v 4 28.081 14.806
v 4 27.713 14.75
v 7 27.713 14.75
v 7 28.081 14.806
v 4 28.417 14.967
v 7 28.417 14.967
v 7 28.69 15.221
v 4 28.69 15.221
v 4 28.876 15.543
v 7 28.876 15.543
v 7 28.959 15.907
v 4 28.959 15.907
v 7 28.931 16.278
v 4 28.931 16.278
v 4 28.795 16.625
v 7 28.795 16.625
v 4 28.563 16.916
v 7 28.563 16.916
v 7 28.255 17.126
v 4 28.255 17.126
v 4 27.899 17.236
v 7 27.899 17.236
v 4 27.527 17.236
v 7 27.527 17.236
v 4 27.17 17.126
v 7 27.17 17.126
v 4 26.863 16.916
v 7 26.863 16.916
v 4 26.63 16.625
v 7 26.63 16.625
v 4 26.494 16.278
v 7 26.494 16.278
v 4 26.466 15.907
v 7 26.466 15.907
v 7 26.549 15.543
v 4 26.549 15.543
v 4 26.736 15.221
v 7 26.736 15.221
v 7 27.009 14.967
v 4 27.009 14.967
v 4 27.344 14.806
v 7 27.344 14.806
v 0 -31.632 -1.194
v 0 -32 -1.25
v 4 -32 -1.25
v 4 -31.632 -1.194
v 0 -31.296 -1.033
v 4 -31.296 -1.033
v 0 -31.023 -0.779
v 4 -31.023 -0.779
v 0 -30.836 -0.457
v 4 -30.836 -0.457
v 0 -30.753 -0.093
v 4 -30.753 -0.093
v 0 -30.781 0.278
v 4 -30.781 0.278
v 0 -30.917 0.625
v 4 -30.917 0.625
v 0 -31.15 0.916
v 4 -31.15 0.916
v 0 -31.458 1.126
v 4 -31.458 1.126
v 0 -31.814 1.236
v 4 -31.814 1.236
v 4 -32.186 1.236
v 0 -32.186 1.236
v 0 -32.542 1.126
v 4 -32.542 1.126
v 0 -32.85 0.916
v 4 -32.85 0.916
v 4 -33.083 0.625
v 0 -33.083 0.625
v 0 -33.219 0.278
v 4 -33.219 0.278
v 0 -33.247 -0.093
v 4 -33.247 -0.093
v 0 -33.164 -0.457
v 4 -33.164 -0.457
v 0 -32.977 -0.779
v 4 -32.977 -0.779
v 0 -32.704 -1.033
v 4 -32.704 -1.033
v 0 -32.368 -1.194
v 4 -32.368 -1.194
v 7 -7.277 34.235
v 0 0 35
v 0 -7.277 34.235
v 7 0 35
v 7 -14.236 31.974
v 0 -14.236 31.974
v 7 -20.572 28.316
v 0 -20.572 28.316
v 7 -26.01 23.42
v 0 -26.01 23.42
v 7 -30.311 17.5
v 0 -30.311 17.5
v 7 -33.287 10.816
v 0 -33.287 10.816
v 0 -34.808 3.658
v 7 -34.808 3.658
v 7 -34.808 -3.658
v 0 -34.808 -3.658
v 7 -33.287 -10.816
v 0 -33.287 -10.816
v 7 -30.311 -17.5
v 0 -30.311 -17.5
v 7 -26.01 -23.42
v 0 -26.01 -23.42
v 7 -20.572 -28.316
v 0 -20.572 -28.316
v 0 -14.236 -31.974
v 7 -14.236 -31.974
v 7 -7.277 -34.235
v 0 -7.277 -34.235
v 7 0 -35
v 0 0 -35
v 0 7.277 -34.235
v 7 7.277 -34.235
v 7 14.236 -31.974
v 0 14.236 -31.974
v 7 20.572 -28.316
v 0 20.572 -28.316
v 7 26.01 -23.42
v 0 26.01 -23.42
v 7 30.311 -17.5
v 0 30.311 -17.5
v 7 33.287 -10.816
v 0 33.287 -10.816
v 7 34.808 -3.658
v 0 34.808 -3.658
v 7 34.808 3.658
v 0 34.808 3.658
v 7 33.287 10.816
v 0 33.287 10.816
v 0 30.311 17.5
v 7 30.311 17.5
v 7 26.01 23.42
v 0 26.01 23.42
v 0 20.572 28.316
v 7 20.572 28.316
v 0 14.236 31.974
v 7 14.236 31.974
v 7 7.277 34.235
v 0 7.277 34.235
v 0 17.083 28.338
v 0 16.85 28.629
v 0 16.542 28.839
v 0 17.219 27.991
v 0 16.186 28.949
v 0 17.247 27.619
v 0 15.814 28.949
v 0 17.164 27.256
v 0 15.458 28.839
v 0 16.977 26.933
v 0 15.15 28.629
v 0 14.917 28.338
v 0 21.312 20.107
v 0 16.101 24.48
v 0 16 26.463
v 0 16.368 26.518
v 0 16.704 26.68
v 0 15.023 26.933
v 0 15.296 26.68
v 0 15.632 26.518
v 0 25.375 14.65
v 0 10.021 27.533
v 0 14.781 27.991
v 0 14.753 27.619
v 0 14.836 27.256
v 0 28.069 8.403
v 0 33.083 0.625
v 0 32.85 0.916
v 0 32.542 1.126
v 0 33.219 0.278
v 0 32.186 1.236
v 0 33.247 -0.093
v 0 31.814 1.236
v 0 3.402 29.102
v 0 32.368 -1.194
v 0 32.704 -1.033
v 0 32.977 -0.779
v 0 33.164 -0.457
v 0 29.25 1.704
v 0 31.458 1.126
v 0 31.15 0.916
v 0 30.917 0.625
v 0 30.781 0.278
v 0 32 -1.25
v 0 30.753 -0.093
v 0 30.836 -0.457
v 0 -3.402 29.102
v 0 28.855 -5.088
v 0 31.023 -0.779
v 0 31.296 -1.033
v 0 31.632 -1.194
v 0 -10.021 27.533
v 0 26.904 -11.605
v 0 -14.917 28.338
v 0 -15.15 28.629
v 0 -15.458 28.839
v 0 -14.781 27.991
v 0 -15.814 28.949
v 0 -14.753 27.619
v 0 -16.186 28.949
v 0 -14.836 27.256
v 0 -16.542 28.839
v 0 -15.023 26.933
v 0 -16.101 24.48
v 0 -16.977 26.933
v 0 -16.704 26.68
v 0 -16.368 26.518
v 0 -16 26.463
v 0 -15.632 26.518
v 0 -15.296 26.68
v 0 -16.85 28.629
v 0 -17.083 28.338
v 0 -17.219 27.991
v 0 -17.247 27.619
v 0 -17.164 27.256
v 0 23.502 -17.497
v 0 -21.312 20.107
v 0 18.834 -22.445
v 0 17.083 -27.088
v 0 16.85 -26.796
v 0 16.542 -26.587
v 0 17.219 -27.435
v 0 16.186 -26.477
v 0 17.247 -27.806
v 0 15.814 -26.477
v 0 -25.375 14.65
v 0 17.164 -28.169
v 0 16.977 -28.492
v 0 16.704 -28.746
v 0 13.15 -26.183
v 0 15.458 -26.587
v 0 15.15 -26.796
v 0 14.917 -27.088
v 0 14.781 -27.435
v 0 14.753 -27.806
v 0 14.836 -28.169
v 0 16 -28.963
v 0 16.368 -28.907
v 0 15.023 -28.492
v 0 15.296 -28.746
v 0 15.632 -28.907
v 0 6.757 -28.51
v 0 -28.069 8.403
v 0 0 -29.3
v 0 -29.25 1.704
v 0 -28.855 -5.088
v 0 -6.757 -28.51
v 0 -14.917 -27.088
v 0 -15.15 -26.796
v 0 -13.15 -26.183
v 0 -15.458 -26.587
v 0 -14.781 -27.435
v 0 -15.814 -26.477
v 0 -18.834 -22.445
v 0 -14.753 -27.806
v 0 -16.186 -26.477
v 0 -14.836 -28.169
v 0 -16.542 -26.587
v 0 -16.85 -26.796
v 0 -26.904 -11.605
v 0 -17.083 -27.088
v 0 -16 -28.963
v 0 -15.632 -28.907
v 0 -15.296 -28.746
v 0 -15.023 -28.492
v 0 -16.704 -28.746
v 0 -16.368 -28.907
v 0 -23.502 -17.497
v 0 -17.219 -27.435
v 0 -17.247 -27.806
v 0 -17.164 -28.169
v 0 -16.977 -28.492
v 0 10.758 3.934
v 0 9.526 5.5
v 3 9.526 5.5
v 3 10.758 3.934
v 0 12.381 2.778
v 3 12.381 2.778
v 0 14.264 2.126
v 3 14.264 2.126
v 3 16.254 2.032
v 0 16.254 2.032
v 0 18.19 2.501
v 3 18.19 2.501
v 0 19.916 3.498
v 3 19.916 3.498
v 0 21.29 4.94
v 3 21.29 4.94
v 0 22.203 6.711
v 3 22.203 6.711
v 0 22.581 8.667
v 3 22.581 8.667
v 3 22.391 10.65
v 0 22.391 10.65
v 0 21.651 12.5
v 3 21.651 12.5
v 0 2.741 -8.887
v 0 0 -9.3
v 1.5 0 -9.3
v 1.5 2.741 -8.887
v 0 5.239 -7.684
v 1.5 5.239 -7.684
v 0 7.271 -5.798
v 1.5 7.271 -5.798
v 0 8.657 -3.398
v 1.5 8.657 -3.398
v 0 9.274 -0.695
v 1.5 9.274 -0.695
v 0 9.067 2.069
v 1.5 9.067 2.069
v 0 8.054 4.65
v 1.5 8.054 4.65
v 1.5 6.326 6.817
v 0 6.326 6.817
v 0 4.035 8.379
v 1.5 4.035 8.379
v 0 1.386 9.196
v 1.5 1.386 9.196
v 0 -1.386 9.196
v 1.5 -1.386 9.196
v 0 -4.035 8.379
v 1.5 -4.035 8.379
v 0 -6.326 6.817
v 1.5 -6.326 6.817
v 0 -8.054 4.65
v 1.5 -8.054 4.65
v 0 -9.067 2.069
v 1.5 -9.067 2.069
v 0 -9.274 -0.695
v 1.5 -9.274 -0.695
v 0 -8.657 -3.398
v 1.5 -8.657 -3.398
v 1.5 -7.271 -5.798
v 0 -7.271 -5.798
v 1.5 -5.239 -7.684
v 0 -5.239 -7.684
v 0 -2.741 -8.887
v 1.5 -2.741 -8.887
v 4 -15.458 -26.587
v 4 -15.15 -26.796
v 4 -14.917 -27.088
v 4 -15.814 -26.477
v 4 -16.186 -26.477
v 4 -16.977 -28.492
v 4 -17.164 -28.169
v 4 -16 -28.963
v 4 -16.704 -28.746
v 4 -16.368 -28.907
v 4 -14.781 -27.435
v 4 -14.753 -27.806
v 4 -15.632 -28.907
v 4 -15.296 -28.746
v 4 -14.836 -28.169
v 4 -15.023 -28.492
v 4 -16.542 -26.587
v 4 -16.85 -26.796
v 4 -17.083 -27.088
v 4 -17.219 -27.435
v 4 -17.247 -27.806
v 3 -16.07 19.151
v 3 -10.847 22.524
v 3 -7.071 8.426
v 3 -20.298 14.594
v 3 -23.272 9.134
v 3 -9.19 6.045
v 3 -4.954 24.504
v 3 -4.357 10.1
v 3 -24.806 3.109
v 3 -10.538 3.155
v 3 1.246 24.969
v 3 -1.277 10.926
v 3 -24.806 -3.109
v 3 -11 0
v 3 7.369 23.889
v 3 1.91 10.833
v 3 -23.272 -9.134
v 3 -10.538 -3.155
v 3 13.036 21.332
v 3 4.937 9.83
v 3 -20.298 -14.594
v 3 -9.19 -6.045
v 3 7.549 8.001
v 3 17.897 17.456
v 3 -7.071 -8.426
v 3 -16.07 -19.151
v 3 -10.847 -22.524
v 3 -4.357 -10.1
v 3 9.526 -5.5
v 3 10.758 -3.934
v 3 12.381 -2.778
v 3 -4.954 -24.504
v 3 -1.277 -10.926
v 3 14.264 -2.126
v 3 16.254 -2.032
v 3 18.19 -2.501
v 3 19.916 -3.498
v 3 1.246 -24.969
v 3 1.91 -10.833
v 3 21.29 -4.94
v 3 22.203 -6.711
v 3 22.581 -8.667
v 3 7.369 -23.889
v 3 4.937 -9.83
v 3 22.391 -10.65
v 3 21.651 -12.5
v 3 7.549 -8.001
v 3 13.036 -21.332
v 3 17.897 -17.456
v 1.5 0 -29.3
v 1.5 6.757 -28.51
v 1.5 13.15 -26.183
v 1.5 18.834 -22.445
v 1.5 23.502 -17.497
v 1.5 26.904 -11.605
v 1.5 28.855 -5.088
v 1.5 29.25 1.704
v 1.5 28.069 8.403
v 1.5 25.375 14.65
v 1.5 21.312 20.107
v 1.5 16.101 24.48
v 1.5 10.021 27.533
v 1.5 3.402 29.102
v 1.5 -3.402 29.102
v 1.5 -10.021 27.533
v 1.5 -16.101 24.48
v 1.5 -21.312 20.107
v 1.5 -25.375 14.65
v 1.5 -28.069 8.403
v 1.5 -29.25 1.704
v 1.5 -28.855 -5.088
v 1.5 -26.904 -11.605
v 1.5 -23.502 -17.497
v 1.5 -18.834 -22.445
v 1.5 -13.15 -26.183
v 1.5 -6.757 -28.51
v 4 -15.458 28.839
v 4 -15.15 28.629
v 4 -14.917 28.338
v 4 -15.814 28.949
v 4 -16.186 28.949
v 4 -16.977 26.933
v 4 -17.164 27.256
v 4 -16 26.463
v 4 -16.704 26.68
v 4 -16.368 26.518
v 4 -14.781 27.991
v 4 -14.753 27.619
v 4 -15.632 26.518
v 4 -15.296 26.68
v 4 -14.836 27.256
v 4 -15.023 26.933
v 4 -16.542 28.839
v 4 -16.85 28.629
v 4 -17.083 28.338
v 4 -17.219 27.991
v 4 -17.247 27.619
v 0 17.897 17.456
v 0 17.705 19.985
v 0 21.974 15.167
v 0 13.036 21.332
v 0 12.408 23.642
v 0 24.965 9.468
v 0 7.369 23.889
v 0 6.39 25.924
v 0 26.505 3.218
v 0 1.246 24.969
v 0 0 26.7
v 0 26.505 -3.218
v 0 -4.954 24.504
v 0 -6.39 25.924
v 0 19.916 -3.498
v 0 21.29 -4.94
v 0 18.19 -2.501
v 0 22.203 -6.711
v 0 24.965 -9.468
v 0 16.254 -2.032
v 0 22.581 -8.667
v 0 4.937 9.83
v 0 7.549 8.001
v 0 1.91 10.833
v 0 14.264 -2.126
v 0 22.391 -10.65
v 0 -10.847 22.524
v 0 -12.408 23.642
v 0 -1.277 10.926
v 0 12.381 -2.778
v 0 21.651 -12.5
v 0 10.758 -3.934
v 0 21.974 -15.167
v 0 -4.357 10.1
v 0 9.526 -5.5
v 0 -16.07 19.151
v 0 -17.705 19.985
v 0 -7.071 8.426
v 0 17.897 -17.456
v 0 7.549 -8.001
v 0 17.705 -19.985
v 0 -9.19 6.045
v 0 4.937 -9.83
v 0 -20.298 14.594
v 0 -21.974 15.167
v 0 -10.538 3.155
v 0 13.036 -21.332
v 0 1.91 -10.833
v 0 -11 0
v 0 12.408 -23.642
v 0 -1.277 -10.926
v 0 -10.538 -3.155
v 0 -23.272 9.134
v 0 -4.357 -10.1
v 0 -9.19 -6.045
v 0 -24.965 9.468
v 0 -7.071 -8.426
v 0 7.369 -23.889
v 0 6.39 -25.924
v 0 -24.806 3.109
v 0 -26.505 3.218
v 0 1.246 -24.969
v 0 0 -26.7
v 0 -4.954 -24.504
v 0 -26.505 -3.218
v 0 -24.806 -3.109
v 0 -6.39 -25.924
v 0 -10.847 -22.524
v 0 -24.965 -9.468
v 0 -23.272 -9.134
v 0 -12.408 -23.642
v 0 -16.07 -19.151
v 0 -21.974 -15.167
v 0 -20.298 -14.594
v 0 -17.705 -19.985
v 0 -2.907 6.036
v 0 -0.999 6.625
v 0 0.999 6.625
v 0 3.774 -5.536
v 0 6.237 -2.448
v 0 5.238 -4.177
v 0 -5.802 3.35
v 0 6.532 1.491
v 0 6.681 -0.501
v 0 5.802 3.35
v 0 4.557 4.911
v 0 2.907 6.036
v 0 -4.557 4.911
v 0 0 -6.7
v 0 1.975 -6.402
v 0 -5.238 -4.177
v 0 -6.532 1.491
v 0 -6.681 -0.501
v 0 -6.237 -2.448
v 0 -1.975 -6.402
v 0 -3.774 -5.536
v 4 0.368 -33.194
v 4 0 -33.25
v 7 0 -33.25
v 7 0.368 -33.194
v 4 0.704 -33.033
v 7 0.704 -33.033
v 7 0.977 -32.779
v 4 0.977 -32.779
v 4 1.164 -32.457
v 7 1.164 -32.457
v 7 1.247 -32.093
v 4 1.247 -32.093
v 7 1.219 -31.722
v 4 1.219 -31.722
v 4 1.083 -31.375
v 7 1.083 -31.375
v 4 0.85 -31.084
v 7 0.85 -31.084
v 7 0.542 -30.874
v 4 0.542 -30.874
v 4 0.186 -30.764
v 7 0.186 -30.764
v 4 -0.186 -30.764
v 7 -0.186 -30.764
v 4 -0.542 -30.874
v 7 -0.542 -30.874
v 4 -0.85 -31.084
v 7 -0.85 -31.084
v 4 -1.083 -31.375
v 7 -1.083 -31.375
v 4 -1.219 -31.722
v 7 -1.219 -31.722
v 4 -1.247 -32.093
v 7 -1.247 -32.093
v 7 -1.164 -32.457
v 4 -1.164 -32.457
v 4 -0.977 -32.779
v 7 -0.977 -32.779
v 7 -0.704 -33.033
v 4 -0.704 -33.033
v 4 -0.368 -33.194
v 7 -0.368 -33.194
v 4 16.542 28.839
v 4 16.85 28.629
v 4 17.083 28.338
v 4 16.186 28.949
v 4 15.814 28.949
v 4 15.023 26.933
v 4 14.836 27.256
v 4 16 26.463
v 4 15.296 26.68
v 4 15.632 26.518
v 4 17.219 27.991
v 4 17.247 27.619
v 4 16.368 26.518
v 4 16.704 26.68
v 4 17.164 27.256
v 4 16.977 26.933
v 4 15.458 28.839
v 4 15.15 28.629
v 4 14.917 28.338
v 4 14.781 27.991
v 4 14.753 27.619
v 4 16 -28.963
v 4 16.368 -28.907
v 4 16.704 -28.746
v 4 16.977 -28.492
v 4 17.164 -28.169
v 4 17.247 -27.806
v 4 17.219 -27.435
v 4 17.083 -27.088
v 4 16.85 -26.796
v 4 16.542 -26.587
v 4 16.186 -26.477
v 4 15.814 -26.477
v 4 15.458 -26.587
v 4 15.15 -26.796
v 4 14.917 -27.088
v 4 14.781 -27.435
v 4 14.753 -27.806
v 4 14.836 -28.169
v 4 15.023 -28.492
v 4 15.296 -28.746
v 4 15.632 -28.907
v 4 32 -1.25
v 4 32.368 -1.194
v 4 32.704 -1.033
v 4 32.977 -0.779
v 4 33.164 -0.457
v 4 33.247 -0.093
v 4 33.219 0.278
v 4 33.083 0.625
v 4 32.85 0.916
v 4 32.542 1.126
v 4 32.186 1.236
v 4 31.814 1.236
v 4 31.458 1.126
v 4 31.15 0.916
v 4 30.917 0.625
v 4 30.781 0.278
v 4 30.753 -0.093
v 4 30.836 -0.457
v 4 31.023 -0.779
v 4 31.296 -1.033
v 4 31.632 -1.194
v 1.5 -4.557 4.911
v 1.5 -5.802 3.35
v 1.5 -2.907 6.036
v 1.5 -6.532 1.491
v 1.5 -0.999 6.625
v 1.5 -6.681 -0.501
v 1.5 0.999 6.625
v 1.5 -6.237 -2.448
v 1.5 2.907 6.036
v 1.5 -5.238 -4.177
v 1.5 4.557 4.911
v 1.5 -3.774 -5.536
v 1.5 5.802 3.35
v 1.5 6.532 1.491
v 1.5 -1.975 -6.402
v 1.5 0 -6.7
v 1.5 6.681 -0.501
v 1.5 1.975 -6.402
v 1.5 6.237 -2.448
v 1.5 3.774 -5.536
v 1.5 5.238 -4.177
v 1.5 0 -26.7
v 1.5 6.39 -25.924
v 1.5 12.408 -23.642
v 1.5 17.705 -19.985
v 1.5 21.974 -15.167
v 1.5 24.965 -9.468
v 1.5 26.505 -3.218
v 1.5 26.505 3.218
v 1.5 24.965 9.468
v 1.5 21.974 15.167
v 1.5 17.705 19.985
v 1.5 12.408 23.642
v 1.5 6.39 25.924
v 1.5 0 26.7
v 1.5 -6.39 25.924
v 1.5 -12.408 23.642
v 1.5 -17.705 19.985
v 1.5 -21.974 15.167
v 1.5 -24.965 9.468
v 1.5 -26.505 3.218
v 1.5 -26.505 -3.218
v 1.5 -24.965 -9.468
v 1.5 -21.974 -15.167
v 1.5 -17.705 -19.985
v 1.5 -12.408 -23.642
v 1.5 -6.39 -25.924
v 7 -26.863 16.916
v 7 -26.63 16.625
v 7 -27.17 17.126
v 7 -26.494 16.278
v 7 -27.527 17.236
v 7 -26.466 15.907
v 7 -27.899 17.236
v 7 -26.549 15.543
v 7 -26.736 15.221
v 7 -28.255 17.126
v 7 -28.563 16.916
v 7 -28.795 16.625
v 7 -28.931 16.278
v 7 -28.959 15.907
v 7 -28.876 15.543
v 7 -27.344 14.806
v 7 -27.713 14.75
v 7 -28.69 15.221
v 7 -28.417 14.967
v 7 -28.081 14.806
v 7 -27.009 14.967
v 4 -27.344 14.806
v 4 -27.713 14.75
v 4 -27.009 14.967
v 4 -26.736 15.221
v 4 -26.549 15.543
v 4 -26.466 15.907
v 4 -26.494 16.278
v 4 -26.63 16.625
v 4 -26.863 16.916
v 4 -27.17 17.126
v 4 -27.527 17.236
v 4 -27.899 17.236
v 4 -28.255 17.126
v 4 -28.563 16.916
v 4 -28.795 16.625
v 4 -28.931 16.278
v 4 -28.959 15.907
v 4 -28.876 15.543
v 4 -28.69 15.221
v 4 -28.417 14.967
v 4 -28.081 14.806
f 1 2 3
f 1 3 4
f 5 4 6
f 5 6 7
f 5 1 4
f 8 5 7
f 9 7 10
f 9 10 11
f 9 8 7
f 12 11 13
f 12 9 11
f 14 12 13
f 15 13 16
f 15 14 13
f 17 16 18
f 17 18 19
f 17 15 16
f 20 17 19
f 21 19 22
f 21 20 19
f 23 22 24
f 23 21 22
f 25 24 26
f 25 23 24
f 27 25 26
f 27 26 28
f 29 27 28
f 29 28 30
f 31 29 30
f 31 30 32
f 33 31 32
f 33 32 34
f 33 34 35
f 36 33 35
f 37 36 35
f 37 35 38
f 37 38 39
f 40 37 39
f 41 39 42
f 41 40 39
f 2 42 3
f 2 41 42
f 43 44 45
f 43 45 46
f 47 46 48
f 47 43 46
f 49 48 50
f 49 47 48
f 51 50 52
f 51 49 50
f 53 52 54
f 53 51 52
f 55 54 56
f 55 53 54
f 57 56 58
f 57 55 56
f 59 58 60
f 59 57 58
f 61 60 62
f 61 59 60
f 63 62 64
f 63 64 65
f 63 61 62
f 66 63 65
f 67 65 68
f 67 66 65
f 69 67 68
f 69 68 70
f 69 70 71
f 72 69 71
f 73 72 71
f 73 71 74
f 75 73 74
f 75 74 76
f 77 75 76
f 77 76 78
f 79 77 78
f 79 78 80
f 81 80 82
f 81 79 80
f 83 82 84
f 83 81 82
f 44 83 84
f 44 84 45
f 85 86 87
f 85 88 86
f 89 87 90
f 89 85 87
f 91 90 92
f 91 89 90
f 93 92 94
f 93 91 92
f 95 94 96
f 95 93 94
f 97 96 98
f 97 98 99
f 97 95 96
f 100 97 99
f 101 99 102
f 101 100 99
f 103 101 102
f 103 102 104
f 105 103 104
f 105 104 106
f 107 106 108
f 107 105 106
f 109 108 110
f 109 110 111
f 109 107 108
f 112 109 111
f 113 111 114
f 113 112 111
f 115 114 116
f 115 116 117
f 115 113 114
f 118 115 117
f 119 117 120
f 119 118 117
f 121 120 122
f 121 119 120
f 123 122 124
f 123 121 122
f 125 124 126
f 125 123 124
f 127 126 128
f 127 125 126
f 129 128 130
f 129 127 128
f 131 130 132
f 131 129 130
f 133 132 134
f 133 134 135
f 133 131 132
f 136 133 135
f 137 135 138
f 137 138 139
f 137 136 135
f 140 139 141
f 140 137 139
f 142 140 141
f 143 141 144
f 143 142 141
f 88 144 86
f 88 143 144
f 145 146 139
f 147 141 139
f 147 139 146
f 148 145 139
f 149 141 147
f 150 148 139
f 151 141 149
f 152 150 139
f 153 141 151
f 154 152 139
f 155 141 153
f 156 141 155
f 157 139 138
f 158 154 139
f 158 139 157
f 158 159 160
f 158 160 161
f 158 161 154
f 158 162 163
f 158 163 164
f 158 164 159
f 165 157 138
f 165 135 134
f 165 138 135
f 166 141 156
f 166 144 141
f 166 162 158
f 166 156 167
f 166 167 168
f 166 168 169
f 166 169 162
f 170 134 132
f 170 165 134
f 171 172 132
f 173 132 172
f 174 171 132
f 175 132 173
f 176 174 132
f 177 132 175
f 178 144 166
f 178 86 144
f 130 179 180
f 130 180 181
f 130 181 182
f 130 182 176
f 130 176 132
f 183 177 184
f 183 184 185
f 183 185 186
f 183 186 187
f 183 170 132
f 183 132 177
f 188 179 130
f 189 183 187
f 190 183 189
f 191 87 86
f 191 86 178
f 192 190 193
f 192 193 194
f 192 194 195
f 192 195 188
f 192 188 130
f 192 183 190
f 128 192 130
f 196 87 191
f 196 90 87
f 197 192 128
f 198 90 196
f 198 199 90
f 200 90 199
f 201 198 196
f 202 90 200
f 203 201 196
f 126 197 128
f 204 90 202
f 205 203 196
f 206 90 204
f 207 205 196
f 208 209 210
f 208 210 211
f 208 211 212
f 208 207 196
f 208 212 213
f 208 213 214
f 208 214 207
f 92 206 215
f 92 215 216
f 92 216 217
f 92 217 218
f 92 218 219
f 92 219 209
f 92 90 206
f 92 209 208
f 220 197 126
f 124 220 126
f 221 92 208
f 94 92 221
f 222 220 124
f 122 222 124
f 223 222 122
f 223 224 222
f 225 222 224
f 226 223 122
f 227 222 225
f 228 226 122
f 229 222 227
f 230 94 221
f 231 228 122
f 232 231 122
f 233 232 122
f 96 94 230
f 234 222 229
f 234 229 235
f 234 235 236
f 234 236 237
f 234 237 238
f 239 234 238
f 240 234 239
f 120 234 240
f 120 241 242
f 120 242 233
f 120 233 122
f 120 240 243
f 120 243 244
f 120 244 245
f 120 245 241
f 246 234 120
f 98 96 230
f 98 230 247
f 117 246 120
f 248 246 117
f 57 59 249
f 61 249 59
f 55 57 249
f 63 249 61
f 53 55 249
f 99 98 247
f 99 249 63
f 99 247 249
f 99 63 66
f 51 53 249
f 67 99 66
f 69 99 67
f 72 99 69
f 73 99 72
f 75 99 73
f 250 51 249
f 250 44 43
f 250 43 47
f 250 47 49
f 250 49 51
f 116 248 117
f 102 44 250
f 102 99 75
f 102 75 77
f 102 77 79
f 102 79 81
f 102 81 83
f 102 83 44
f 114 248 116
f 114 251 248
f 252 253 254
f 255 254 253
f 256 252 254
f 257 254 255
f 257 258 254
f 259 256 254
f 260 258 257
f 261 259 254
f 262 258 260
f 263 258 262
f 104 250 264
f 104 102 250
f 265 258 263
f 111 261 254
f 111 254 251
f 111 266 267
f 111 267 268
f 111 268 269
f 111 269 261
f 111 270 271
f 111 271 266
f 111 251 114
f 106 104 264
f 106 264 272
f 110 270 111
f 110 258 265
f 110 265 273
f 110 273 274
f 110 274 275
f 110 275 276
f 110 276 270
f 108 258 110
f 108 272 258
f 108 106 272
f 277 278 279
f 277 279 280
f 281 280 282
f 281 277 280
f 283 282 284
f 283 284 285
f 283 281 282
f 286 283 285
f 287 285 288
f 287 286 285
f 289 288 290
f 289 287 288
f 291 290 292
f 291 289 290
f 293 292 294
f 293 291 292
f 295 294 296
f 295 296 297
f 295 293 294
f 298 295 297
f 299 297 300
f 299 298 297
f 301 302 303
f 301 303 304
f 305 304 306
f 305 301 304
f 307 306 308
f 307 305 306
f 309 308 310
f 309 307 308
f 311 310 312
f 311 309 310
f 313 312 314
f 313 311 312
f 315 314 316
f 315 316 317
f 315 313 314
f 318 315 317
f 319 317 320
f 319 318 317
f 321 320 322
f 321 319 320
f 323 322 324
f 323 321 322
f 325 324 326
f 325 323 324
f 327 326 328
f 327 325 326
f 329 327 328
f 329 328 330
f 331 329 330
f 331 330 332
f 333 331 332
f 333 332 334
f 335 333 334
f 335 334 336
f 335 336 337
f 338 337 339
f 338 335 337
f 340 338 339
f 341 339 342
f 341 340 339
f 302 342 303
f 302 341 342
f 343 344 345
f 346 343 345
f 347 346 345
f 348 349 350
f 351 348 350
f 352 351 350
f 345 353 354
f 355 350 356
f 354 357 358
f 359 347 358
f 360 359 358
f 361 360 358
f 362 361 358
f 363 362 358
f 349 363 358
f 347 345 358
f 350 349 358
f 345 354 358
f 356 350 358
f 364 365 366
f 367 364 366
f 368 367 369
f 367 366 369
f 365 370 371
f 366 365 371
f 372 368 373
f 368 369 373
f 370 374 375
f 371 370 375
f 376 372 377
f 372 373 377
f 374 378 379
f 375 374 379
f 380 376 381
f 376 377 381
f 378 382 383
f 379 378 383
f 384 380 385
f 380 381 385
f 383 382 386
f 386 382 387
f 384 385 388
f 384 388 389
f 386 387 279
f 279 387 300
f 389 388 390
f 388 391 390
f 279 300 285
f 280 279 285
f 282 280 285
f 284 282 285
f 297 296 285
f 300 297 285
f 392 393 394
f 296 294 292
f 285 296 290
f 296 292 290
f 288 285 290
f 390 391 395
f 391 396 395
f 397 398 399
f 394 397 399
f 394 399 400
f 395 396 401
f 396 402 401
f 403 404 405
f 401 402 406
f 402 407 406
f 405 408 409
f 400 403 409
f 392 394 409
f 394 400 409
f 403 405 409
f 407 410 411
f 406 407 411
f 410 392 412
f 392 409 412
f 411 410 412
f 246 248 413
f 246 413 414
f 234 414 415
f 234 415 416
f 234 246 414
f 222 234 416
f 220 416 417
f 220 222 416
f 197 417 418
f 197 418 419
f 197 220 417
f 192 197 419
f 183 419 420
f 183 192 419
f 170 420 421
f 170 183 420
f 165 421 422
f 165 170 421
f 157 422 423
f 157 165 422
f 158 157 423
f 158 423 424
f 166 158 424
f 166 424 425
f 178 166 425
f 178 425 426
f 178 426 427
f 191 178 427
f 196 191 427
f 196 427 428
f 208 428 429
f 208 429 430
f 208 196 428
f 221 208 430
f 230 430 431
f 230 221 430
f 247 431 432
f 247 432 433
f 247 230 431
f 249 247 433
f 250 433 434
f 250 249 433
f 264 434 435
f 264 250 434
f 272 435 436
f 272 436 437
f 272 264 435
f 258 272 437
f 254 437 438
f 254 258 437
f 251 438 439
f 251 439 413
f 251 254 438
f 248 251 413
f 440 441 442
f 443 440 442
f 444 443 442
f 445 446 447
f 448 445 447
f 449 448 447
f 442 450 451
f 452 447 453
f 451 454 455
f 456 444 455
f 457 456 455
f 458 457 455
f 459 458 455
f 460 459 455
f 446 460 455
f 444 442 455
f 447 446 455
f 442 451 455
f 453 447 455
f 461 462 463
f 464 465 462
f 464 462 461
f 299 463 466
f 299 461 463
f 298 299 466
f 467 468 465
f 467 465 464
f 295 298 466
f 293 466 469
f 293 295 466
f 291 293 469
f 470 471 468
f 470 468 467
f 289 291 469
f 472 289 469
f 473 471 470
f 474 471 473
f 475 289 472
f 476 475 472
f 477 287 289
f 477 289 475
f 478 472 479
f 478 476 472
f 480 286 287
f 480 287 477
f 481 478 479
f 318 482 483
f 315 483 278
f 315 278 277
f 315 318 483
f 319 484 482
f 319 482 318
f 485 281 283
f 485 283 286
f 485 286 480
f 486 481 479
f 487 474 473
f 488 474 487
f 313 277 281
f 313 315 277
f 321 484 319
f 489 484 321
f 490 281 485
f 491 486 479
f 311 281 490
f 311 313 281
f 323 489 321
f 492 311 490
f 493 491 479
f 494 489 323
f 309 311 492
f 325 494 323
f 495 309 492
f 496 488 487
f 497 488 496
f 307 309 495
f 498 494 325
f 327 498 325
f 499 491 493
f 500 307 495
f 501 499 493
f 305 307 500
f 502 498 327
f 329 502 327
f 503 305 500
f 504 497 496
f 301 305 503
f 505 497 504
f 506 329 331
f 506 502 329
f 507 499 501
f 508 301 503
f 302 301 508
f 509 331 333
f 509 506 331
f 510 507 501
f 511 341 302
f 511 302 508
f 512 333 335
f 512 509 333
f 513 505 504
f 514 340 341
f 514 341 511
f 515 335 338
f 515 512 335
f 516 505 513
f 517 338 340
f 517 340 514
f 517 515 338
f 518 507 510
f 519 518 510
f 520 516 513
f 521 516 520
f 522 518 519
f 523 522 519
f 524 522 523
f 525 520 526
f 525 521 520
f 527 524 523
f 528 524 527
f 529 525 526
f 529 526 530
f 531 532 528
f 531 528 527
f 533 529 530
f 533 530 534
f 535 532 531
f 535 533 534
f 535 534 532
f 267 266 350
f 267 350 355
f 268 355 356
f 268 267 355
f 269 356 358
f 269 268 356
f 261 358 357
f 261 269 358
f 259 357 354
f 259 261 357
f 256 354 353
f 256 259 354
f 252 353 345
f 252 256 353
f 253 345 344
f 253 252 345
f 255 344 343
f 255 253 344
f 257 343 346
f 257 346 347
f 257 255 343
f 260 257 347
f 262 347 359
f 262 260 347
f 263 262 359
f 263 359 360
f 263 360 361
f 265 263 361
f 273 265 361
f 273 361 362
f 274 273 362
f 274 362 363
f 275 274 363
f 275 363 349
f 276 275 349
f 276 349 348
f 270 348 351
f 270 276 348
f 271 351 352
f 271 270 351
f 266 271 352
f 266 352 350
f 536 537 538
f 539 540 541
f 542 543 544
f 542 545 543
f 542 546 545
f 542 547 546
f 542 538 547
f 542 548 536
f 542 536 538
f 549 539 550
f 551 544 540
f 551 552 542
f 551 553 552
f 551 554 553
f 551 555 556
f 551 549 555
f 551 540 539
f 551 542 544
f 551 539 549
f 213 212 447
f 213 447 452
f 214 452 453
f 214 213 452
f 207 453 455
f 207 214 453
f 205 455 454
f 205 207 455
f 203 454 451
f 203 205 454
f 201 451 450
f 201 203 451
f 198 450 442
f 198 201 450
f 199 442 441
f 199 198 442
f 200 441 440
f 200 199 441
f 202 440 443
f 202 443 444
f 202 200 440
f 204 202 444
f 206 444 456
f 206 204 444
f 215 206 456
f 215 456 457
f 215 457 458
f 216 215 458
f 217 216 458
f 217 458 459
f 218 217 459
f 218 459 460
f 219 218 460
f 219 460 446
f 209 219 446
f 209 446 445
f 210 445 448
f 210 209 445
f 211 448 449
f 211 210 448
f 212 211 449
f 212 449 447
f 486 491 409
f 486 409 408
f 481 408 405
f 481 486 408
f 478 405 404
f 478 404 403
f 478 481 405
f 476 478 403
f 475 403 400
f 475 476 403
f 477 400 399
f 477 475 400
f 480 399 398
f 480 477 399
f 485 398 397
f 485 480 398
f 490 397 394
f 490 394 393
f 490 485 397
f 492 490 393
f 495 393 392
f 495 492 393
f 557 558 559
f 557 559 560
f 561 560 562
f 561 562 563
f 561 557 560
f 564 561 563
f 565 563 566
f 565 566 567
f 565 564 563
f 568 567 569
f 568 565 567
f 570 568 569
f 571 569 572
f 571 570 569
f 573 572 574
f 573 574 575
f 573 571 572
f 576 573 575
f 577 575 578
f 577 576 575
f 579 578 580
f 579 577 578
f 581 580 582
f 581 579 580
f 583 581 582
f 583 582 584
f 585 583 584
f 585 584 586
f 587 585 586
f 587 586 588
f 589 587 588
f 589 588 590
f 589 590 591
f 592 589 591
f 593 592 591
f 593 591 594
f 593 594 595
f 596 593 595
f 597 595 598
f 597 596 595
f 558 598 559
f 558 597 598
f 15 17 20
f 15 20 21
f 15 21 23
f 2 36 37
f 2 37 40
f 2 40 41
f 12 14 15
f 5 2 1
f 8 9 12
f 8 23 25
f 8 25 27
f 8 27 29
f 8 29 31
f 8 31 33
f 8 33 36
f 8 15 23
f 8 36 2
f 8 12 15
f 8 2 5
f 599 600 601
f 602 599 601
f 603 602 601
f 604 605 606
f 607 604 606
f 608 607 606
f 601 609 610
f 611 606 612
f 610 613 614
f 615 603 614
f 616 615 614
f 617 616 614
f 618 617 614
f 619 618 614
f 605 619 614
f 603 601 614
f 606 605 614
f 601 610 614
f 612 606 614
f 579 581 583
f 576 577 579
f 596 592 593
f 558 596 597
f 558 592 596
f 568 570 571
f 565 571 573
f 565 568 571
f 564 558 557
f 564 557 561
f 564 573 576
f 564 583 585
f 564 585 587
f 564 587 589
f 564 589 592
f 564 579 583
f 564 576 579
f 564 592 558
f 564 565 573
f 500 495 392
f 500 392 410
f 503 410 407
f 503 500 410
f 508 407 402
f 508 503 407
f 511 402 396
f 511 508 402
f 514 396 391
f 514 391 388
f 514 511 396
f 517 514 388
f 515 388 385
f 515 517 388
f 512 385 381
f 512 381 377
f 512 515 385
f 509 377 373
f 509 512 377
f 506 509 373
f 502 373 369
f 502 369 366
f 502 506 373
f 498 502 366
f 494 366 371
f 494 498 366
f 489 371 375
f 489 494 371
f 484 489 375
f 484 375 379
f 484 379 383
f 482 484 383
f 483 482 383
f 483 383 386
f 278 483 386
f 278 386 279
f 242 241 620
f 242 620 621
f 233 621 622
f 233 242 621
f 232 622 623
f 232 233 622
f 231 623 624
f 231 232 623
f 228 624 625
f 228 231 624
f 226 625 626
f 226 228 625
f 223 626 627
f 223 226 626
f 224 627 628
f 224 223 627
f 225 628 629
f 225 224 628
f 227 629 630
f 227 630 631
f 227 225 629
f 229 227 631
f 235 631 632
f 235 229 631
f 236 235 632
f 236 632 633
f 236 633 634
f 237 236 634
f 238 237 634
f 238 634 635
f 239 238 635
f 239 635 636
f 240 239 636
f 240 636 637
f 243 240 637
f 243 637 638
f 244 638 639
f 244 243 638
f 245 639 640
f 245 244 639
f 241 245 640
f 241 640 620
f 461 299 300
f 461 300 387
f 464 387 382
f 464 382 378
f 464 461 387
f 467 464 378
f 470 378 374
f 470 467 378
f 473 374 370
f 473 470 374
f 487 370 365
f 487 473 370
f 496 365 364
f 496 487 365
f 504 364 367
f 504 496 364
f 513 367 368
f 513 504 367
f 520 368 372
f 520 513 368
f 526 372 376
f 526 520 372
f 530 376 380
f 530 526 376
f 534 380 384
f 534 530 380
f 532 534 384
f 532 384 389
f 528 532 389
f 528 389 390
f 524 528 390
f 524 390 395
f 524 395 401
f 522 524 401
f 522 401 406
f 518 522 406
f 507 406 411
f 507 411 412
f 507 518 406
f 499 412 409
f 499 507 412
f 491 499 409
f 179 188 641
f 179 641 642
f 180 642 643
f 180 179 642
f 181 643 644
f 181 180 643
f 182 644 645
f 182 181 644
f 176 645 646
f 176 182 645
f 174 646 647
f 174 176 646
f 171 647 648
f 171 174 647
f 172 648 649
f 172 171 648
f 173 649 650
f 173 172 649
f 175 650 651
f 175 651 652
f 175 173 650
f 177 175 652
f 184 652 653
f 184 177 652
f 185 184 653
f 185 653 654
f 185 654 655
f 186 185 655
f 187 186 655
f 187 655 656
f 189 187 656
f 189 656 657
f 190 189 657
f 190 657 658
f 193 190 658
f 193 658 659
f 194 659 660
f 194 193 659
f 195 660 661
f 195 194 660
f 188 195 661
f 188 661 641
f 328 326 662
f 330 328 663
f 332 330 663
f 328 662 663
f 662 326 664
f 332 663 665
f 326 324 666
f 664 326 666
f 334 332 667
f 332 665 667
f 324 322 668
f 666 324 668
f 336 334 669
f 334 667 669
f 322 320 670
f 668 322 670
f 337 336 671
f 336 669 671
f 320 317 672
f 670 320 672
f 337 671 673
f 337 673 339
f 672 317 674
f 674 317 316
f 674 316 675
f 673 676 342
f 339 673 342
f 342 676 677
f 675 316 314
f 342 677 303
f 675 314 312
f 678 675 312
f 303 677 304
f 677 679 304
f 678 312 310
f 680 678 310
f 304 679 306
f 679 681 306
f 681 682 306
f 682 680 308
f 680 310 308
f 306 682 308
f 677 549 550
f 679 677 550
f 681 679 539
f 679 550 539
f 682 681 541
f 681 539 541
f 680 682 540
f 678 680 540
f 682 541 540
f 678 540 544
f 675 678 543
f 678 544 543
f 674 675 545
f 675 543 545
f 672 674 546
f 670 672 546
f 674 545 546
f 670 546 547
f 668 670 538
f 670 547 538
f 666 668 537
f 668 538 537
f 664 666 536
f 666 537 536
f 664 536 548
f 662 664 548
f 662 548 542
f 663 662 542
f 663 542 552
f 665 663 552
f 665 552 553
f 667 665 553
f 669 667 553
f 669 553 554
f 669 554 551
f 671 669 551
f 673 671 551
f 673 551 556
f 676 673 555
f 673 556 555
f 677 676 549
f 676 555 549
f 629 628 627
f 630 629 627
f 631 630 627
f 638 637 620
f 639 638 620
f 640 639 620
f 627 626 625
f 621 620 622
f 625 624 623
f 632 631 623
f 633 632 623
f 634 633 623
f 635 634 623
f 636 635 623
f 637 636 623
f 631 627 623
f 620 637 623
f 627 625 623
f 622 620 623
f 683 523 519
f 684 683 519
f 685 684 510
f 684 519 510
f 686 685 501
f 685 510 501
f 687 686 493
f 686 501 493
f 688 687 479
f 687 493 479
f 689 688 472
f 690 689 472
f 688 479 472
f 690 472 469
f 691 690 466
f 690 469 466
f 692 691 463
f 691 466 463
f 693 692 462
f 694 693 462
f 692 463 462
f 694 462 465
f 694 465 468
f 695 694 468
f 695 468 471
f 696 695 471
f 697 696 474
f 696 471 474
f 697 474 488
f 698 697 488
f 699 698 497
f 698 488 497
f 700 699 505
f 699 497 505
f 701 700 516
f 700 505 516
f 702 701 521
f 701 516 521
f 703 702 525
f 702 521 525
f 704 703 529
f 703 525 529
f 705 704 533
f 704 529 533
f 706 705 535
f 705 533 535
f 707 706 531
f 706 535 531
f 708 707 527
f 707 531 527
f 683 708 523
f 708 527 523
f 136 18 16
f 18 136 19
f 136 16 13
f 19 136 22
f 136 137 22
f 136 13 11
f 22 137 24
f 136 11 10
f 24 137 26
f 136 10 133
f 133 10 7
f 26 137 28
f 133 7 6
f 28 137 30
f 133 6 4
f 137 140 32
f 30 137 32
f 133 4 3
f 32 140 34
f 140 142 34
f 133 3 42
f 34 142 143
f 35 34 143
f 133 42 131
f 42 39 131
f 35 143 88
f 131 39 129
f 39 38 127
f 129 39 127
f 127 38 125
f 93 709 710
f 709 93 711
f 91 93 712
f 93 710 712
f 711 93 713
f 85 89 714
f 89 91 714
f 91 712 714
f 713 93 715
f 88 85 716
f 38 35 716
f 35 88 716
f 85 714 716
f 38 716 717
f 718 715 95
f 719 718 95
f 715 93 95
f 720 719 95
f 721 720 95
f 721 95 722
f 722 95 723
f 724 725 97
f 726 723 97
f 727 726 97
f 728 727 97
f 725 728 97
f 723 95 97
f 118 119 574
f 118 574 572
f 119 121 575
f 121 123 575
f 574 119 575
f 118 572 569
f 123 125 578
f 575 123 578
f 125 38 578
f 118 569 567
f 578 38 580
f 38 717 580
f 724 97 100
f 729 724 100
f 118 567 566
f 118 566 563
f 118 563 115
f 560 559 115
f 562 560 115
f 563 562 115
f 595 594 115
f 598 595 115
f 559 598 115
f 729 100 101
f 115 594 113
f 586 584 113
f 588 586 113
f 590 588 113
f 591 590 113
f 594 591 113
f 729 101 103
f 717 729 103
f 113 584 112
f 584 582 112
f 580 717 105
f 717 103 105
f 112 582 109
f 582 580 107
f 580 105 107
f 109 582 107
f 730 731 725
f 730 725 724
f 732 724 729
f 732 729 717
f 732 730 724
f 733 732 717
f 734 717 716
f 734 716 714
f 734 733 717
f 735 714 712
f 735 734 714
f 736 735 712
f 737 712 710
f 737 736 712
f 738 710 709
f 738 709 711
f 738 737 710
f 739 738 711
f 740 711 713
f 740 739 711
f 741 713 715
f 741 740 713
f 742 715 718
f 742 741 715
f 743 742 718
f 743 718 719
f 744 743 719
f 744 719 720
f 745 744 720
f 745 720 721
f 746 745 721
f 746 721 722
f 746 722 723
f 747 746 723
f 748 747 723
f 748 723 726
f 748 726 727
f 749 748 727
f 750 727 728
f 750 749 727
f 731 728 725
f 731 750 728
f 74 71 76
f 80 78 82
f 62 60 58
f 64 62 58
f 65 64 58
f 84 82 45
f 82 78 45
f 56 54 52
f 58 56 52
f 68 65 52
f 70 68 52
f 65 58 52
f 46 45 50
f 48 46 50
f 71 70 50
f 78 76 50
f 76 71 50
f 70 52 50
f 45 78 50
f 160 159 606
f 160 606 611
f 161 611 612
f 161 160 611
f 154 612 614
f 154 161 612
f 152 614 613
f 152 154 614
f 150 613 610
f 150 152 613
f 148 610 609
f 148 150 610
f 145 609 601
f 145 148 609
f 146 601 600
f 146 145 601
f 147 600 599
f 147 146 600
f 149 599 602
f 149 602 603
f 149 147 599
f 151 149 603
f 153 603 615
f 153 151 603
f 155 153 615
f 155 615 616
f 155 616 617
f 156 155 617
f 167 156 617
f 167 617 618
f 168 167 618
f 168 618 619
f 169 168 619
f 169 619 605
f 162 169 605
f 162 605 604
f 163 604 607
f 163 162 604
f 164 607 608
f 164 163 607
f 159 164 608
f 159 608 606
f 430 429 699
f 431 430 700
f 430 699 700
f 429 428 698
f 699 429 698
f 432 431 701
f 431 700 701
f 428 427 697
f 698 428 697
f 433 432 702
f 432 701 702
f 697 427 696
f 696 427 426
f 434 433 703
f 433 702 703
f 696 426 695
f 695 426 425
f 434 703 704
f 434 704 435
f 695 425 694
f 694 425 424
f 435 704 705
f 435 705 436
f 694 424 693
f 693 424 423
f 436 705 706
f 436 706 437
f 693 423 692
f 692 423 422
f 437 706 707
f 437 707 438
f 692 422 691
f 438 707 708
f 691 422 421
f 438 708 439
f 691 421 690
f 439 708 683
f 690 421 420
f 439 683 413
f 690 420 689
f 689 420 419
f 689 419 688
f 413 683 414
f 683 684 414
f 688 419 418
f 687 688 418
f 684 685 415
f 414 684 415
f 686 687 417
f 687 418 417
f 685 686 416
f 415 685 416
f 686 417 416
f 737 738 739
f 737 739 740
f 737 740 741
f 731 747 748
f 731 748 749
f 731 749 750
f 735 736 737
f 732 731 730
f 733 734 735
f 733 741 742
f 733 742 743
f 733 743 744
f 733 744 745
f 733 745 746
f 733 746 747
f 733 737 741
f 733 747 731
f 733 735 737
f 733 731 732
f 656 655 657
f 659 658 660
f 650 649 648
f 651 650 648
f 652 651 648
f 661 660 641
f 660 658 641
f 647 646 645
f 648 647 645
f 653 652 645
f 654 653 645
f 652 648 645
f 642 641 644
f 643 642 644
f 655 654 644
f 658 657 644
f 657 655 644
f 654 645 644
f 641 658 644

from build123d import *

# Parameters (mm, degrees)
BLANK_OD70_THICKNESS7_MM_W                    = 7
BLANK_OD70_THICKNESS7_MM_H                    = 35
WATER_PASSAGE_R11_25_DEPTH3_ROUND_END_C_DEPTH = 3
INNER_FACE_SEAL_GLAND_WIDTH2P6_DEPTH_2_R      = 9.3
INNER_FACE_SEAL_GLAND_WIDTH2P6_DEPTH_2_R_2    = 6.7
INNER_FACE_SEAL_GLAND_WIDTH2P6_DEPTH1P5_DEPTH = 1.5
OUTER_FACE_SEAL_GLAND_WIDTH2P6_DEPTH_2_R      = 29.3
OUTER_FACE_SEAL_GLAND_WIDTH2P6_DEPTH_2_R_2    = 26.7
OUTER_FACE_SEAL_GLAND_WIDTH2P6_DEPTH1P5_DEPTH = 1.5
SIX_REAR_COVER_M3_PILOT_BORES_DEPTH4_SKE_R    = 1.25
SIX_REAR_COVER_M3_PILOT_BORES_DEPTH4_DEPTH    = 4
THREE_START                                   = 4
THREE_FRONT_CLAMP_M3_PILOT_BORES_DEP_2_R      = 1.25
THREE_FRONT_CLAMP_M3_PILOT_BORES_DEPTH3_DEPTH = 3


with BuildPart() as part:
    # Blank OD70 thickness7 mm → Copper blank - OD70 x7 (revolve)
    with BuildSketch(Plane.XY, mode=Mode.PRIVATE) as copper_blank_od70_x7_sk:
        with Locations((3.5, 17.5)):
            Rectangle(BLANK_OD70_THICKNESS7_MM_W, BLANK_OD70_THICKNESS7_MM_H)
    revolve(copper_blank_od70_x7_sk.sketch.rotate(Axis((-10, 0, 0), (1, 0, 0)), 90), axis=Axis((-10, 0, 0), (1, 0, 0)))

    # Water passage R11-25 depth3 round-en 2 → Water passage R11-25 depth3 round-end C (cut)
    with BuildSketch(Plane(origin=(0, 0, 0), x_dir=(0, 0, -1), z_dir=(1, 0, 0))):
        with BuildLine():
            ThreePointArc((-12.5, 21.650635095), (0, -25), (12.5, 21.650635095))
            ThreePointArc((12.5, 21.650635095), (2.937822174, 19.088457268), (5.5, 9.526279442))
            ThreePointArc((5.5, 9.526279442), (0, -11), (-5.5, 9.526279442))
            ThreePointArc((-5.5, 9.526279442), (-2.937822174, 19.088457268), (-12.5, 21.650635095))
        make_face()
    extrude(amount=WATER_PASSAGE_R11_25_DEPTH3_ROUND_END_C_DEPTH, mode=Mode.SUBTRACT)

    # Inner face-seal gland width2p6 depth 2 → Inner face-seal gland width2p6 depth1p5 (cut)
    with BuildSketch(Plane(origin=(0, 0, 0), x_dir=(0, 0, -1), z_dir=(1, 0, 0))):
        Circle(INNER_FACE_SEAL_GLAND_WIDTH2P6_DEPTH_2_R)
        Circle(INNER_FACE_SEAL_GLAND_WIDTH2P6_DEPTH_2_R_2, mode=Mode.SUBTRACT)
    extrude(amount=INNER_FACE_SEAL_GLAND_WIDTH2P6_DEPTH1P5_DEPTH, mode=Mode.SUBTRACT)

    # Outer face-seal gland width2p6 depth 2 → Outer face-seal gland width2p6 depth1p5 (cut)
    with BuildSketch(Plane(origin=(0, 0, 0), x_dir=(0, 0, -1), z_dir=(1, 0, 0))):
        Circle(OUTER_FACE_SEAL_GLAND_WIDTH2P6_DEPTH_2_R)
        Circle(OUTER_FACE_SEAL_GLAND_WIDTH2P6_DEPTH_2_R_2, mode=Mode.SUBTRACT)
    extrude(amount=OUTER_FACE_SEAL_GLAND_WIDTH2P6_DEPTH1P5_DEPTH, mode=Mode.SUBTRACT)

    # Six rear cover M3 pilot bores depth4 sketch → Six rear cover M3 pilot bores depth4 (cut)
    with BuildSketch(Plane(origin=(0, 0, 0), x_dir=(0, 0, -1), z_dir=(1, 0, 0))):
        with Locations((0, 32)):
            Circle(SIX_REAR_COVER_M3_PILOT_BORES_DEPTH4_SKE_R)
        with Locations((-27.712812921, 16)):
            Circle(SIX_REAR_COVER_M3_PILOT_BORES_DEPTH4_SKE_R)
        with Locations((-27.712812921, -16)):
            Circle(SIX_REAR_COVER_M3_PILOT_BORES_DEPTH4_SKE_R)
        with Locations((0, -32)):
            Circle(SIX_REAR_COVER_M3_PILOT_BORES_DEPTH4_SKE_R)
        with Locations((27.712812921, -16)):
            Circle(SIX_REAR_COVER_M3_PILOT_BORES_DEPTH4_SKE_R)
        with Locations((27.712812921, 16)):
            Circle(SIX_REAR_COVER_M3_PILOT_BORES_DEPTH4_SKE_R)
    extrude(amount=SIX_REAR_COVER_M3_PILOT_BORES_DEPTH4_DEPTH, mode=Mode.SUBTRACT)

    # Three front clamp M3 pilot bores dep 2 → Three front clamp M3 pilot bores depth3 (cut)
    with BuildSketch(Plane(origin=(0, 0, 0), x_dir=(0, 0, -1), z_dir=(1, 0, 0)).offset(THREE_START)):
        with Locations((-16, 27.712812921)):
            Circle(THREE_FRONT_CLAMP_M3_PILOT_BORES_DEP_2_R)
        with Locations((-16, -27.712812921)):
            Circle(THREE_FRONT_CLAMP_M3_PILOT_BORES_DEP_2_R)
        with Locations((32, 0)):
            Circle(THREE_FRONT_CLAMP_M3_PILOT_BORES_DEP_2_R)
    extrude(amount=THREE_FRONT_CLAMP_M3_PILOT_BORES_DEPTH3_DEPTH, mode=Mode.SUBTRACT)


solid = part.part
